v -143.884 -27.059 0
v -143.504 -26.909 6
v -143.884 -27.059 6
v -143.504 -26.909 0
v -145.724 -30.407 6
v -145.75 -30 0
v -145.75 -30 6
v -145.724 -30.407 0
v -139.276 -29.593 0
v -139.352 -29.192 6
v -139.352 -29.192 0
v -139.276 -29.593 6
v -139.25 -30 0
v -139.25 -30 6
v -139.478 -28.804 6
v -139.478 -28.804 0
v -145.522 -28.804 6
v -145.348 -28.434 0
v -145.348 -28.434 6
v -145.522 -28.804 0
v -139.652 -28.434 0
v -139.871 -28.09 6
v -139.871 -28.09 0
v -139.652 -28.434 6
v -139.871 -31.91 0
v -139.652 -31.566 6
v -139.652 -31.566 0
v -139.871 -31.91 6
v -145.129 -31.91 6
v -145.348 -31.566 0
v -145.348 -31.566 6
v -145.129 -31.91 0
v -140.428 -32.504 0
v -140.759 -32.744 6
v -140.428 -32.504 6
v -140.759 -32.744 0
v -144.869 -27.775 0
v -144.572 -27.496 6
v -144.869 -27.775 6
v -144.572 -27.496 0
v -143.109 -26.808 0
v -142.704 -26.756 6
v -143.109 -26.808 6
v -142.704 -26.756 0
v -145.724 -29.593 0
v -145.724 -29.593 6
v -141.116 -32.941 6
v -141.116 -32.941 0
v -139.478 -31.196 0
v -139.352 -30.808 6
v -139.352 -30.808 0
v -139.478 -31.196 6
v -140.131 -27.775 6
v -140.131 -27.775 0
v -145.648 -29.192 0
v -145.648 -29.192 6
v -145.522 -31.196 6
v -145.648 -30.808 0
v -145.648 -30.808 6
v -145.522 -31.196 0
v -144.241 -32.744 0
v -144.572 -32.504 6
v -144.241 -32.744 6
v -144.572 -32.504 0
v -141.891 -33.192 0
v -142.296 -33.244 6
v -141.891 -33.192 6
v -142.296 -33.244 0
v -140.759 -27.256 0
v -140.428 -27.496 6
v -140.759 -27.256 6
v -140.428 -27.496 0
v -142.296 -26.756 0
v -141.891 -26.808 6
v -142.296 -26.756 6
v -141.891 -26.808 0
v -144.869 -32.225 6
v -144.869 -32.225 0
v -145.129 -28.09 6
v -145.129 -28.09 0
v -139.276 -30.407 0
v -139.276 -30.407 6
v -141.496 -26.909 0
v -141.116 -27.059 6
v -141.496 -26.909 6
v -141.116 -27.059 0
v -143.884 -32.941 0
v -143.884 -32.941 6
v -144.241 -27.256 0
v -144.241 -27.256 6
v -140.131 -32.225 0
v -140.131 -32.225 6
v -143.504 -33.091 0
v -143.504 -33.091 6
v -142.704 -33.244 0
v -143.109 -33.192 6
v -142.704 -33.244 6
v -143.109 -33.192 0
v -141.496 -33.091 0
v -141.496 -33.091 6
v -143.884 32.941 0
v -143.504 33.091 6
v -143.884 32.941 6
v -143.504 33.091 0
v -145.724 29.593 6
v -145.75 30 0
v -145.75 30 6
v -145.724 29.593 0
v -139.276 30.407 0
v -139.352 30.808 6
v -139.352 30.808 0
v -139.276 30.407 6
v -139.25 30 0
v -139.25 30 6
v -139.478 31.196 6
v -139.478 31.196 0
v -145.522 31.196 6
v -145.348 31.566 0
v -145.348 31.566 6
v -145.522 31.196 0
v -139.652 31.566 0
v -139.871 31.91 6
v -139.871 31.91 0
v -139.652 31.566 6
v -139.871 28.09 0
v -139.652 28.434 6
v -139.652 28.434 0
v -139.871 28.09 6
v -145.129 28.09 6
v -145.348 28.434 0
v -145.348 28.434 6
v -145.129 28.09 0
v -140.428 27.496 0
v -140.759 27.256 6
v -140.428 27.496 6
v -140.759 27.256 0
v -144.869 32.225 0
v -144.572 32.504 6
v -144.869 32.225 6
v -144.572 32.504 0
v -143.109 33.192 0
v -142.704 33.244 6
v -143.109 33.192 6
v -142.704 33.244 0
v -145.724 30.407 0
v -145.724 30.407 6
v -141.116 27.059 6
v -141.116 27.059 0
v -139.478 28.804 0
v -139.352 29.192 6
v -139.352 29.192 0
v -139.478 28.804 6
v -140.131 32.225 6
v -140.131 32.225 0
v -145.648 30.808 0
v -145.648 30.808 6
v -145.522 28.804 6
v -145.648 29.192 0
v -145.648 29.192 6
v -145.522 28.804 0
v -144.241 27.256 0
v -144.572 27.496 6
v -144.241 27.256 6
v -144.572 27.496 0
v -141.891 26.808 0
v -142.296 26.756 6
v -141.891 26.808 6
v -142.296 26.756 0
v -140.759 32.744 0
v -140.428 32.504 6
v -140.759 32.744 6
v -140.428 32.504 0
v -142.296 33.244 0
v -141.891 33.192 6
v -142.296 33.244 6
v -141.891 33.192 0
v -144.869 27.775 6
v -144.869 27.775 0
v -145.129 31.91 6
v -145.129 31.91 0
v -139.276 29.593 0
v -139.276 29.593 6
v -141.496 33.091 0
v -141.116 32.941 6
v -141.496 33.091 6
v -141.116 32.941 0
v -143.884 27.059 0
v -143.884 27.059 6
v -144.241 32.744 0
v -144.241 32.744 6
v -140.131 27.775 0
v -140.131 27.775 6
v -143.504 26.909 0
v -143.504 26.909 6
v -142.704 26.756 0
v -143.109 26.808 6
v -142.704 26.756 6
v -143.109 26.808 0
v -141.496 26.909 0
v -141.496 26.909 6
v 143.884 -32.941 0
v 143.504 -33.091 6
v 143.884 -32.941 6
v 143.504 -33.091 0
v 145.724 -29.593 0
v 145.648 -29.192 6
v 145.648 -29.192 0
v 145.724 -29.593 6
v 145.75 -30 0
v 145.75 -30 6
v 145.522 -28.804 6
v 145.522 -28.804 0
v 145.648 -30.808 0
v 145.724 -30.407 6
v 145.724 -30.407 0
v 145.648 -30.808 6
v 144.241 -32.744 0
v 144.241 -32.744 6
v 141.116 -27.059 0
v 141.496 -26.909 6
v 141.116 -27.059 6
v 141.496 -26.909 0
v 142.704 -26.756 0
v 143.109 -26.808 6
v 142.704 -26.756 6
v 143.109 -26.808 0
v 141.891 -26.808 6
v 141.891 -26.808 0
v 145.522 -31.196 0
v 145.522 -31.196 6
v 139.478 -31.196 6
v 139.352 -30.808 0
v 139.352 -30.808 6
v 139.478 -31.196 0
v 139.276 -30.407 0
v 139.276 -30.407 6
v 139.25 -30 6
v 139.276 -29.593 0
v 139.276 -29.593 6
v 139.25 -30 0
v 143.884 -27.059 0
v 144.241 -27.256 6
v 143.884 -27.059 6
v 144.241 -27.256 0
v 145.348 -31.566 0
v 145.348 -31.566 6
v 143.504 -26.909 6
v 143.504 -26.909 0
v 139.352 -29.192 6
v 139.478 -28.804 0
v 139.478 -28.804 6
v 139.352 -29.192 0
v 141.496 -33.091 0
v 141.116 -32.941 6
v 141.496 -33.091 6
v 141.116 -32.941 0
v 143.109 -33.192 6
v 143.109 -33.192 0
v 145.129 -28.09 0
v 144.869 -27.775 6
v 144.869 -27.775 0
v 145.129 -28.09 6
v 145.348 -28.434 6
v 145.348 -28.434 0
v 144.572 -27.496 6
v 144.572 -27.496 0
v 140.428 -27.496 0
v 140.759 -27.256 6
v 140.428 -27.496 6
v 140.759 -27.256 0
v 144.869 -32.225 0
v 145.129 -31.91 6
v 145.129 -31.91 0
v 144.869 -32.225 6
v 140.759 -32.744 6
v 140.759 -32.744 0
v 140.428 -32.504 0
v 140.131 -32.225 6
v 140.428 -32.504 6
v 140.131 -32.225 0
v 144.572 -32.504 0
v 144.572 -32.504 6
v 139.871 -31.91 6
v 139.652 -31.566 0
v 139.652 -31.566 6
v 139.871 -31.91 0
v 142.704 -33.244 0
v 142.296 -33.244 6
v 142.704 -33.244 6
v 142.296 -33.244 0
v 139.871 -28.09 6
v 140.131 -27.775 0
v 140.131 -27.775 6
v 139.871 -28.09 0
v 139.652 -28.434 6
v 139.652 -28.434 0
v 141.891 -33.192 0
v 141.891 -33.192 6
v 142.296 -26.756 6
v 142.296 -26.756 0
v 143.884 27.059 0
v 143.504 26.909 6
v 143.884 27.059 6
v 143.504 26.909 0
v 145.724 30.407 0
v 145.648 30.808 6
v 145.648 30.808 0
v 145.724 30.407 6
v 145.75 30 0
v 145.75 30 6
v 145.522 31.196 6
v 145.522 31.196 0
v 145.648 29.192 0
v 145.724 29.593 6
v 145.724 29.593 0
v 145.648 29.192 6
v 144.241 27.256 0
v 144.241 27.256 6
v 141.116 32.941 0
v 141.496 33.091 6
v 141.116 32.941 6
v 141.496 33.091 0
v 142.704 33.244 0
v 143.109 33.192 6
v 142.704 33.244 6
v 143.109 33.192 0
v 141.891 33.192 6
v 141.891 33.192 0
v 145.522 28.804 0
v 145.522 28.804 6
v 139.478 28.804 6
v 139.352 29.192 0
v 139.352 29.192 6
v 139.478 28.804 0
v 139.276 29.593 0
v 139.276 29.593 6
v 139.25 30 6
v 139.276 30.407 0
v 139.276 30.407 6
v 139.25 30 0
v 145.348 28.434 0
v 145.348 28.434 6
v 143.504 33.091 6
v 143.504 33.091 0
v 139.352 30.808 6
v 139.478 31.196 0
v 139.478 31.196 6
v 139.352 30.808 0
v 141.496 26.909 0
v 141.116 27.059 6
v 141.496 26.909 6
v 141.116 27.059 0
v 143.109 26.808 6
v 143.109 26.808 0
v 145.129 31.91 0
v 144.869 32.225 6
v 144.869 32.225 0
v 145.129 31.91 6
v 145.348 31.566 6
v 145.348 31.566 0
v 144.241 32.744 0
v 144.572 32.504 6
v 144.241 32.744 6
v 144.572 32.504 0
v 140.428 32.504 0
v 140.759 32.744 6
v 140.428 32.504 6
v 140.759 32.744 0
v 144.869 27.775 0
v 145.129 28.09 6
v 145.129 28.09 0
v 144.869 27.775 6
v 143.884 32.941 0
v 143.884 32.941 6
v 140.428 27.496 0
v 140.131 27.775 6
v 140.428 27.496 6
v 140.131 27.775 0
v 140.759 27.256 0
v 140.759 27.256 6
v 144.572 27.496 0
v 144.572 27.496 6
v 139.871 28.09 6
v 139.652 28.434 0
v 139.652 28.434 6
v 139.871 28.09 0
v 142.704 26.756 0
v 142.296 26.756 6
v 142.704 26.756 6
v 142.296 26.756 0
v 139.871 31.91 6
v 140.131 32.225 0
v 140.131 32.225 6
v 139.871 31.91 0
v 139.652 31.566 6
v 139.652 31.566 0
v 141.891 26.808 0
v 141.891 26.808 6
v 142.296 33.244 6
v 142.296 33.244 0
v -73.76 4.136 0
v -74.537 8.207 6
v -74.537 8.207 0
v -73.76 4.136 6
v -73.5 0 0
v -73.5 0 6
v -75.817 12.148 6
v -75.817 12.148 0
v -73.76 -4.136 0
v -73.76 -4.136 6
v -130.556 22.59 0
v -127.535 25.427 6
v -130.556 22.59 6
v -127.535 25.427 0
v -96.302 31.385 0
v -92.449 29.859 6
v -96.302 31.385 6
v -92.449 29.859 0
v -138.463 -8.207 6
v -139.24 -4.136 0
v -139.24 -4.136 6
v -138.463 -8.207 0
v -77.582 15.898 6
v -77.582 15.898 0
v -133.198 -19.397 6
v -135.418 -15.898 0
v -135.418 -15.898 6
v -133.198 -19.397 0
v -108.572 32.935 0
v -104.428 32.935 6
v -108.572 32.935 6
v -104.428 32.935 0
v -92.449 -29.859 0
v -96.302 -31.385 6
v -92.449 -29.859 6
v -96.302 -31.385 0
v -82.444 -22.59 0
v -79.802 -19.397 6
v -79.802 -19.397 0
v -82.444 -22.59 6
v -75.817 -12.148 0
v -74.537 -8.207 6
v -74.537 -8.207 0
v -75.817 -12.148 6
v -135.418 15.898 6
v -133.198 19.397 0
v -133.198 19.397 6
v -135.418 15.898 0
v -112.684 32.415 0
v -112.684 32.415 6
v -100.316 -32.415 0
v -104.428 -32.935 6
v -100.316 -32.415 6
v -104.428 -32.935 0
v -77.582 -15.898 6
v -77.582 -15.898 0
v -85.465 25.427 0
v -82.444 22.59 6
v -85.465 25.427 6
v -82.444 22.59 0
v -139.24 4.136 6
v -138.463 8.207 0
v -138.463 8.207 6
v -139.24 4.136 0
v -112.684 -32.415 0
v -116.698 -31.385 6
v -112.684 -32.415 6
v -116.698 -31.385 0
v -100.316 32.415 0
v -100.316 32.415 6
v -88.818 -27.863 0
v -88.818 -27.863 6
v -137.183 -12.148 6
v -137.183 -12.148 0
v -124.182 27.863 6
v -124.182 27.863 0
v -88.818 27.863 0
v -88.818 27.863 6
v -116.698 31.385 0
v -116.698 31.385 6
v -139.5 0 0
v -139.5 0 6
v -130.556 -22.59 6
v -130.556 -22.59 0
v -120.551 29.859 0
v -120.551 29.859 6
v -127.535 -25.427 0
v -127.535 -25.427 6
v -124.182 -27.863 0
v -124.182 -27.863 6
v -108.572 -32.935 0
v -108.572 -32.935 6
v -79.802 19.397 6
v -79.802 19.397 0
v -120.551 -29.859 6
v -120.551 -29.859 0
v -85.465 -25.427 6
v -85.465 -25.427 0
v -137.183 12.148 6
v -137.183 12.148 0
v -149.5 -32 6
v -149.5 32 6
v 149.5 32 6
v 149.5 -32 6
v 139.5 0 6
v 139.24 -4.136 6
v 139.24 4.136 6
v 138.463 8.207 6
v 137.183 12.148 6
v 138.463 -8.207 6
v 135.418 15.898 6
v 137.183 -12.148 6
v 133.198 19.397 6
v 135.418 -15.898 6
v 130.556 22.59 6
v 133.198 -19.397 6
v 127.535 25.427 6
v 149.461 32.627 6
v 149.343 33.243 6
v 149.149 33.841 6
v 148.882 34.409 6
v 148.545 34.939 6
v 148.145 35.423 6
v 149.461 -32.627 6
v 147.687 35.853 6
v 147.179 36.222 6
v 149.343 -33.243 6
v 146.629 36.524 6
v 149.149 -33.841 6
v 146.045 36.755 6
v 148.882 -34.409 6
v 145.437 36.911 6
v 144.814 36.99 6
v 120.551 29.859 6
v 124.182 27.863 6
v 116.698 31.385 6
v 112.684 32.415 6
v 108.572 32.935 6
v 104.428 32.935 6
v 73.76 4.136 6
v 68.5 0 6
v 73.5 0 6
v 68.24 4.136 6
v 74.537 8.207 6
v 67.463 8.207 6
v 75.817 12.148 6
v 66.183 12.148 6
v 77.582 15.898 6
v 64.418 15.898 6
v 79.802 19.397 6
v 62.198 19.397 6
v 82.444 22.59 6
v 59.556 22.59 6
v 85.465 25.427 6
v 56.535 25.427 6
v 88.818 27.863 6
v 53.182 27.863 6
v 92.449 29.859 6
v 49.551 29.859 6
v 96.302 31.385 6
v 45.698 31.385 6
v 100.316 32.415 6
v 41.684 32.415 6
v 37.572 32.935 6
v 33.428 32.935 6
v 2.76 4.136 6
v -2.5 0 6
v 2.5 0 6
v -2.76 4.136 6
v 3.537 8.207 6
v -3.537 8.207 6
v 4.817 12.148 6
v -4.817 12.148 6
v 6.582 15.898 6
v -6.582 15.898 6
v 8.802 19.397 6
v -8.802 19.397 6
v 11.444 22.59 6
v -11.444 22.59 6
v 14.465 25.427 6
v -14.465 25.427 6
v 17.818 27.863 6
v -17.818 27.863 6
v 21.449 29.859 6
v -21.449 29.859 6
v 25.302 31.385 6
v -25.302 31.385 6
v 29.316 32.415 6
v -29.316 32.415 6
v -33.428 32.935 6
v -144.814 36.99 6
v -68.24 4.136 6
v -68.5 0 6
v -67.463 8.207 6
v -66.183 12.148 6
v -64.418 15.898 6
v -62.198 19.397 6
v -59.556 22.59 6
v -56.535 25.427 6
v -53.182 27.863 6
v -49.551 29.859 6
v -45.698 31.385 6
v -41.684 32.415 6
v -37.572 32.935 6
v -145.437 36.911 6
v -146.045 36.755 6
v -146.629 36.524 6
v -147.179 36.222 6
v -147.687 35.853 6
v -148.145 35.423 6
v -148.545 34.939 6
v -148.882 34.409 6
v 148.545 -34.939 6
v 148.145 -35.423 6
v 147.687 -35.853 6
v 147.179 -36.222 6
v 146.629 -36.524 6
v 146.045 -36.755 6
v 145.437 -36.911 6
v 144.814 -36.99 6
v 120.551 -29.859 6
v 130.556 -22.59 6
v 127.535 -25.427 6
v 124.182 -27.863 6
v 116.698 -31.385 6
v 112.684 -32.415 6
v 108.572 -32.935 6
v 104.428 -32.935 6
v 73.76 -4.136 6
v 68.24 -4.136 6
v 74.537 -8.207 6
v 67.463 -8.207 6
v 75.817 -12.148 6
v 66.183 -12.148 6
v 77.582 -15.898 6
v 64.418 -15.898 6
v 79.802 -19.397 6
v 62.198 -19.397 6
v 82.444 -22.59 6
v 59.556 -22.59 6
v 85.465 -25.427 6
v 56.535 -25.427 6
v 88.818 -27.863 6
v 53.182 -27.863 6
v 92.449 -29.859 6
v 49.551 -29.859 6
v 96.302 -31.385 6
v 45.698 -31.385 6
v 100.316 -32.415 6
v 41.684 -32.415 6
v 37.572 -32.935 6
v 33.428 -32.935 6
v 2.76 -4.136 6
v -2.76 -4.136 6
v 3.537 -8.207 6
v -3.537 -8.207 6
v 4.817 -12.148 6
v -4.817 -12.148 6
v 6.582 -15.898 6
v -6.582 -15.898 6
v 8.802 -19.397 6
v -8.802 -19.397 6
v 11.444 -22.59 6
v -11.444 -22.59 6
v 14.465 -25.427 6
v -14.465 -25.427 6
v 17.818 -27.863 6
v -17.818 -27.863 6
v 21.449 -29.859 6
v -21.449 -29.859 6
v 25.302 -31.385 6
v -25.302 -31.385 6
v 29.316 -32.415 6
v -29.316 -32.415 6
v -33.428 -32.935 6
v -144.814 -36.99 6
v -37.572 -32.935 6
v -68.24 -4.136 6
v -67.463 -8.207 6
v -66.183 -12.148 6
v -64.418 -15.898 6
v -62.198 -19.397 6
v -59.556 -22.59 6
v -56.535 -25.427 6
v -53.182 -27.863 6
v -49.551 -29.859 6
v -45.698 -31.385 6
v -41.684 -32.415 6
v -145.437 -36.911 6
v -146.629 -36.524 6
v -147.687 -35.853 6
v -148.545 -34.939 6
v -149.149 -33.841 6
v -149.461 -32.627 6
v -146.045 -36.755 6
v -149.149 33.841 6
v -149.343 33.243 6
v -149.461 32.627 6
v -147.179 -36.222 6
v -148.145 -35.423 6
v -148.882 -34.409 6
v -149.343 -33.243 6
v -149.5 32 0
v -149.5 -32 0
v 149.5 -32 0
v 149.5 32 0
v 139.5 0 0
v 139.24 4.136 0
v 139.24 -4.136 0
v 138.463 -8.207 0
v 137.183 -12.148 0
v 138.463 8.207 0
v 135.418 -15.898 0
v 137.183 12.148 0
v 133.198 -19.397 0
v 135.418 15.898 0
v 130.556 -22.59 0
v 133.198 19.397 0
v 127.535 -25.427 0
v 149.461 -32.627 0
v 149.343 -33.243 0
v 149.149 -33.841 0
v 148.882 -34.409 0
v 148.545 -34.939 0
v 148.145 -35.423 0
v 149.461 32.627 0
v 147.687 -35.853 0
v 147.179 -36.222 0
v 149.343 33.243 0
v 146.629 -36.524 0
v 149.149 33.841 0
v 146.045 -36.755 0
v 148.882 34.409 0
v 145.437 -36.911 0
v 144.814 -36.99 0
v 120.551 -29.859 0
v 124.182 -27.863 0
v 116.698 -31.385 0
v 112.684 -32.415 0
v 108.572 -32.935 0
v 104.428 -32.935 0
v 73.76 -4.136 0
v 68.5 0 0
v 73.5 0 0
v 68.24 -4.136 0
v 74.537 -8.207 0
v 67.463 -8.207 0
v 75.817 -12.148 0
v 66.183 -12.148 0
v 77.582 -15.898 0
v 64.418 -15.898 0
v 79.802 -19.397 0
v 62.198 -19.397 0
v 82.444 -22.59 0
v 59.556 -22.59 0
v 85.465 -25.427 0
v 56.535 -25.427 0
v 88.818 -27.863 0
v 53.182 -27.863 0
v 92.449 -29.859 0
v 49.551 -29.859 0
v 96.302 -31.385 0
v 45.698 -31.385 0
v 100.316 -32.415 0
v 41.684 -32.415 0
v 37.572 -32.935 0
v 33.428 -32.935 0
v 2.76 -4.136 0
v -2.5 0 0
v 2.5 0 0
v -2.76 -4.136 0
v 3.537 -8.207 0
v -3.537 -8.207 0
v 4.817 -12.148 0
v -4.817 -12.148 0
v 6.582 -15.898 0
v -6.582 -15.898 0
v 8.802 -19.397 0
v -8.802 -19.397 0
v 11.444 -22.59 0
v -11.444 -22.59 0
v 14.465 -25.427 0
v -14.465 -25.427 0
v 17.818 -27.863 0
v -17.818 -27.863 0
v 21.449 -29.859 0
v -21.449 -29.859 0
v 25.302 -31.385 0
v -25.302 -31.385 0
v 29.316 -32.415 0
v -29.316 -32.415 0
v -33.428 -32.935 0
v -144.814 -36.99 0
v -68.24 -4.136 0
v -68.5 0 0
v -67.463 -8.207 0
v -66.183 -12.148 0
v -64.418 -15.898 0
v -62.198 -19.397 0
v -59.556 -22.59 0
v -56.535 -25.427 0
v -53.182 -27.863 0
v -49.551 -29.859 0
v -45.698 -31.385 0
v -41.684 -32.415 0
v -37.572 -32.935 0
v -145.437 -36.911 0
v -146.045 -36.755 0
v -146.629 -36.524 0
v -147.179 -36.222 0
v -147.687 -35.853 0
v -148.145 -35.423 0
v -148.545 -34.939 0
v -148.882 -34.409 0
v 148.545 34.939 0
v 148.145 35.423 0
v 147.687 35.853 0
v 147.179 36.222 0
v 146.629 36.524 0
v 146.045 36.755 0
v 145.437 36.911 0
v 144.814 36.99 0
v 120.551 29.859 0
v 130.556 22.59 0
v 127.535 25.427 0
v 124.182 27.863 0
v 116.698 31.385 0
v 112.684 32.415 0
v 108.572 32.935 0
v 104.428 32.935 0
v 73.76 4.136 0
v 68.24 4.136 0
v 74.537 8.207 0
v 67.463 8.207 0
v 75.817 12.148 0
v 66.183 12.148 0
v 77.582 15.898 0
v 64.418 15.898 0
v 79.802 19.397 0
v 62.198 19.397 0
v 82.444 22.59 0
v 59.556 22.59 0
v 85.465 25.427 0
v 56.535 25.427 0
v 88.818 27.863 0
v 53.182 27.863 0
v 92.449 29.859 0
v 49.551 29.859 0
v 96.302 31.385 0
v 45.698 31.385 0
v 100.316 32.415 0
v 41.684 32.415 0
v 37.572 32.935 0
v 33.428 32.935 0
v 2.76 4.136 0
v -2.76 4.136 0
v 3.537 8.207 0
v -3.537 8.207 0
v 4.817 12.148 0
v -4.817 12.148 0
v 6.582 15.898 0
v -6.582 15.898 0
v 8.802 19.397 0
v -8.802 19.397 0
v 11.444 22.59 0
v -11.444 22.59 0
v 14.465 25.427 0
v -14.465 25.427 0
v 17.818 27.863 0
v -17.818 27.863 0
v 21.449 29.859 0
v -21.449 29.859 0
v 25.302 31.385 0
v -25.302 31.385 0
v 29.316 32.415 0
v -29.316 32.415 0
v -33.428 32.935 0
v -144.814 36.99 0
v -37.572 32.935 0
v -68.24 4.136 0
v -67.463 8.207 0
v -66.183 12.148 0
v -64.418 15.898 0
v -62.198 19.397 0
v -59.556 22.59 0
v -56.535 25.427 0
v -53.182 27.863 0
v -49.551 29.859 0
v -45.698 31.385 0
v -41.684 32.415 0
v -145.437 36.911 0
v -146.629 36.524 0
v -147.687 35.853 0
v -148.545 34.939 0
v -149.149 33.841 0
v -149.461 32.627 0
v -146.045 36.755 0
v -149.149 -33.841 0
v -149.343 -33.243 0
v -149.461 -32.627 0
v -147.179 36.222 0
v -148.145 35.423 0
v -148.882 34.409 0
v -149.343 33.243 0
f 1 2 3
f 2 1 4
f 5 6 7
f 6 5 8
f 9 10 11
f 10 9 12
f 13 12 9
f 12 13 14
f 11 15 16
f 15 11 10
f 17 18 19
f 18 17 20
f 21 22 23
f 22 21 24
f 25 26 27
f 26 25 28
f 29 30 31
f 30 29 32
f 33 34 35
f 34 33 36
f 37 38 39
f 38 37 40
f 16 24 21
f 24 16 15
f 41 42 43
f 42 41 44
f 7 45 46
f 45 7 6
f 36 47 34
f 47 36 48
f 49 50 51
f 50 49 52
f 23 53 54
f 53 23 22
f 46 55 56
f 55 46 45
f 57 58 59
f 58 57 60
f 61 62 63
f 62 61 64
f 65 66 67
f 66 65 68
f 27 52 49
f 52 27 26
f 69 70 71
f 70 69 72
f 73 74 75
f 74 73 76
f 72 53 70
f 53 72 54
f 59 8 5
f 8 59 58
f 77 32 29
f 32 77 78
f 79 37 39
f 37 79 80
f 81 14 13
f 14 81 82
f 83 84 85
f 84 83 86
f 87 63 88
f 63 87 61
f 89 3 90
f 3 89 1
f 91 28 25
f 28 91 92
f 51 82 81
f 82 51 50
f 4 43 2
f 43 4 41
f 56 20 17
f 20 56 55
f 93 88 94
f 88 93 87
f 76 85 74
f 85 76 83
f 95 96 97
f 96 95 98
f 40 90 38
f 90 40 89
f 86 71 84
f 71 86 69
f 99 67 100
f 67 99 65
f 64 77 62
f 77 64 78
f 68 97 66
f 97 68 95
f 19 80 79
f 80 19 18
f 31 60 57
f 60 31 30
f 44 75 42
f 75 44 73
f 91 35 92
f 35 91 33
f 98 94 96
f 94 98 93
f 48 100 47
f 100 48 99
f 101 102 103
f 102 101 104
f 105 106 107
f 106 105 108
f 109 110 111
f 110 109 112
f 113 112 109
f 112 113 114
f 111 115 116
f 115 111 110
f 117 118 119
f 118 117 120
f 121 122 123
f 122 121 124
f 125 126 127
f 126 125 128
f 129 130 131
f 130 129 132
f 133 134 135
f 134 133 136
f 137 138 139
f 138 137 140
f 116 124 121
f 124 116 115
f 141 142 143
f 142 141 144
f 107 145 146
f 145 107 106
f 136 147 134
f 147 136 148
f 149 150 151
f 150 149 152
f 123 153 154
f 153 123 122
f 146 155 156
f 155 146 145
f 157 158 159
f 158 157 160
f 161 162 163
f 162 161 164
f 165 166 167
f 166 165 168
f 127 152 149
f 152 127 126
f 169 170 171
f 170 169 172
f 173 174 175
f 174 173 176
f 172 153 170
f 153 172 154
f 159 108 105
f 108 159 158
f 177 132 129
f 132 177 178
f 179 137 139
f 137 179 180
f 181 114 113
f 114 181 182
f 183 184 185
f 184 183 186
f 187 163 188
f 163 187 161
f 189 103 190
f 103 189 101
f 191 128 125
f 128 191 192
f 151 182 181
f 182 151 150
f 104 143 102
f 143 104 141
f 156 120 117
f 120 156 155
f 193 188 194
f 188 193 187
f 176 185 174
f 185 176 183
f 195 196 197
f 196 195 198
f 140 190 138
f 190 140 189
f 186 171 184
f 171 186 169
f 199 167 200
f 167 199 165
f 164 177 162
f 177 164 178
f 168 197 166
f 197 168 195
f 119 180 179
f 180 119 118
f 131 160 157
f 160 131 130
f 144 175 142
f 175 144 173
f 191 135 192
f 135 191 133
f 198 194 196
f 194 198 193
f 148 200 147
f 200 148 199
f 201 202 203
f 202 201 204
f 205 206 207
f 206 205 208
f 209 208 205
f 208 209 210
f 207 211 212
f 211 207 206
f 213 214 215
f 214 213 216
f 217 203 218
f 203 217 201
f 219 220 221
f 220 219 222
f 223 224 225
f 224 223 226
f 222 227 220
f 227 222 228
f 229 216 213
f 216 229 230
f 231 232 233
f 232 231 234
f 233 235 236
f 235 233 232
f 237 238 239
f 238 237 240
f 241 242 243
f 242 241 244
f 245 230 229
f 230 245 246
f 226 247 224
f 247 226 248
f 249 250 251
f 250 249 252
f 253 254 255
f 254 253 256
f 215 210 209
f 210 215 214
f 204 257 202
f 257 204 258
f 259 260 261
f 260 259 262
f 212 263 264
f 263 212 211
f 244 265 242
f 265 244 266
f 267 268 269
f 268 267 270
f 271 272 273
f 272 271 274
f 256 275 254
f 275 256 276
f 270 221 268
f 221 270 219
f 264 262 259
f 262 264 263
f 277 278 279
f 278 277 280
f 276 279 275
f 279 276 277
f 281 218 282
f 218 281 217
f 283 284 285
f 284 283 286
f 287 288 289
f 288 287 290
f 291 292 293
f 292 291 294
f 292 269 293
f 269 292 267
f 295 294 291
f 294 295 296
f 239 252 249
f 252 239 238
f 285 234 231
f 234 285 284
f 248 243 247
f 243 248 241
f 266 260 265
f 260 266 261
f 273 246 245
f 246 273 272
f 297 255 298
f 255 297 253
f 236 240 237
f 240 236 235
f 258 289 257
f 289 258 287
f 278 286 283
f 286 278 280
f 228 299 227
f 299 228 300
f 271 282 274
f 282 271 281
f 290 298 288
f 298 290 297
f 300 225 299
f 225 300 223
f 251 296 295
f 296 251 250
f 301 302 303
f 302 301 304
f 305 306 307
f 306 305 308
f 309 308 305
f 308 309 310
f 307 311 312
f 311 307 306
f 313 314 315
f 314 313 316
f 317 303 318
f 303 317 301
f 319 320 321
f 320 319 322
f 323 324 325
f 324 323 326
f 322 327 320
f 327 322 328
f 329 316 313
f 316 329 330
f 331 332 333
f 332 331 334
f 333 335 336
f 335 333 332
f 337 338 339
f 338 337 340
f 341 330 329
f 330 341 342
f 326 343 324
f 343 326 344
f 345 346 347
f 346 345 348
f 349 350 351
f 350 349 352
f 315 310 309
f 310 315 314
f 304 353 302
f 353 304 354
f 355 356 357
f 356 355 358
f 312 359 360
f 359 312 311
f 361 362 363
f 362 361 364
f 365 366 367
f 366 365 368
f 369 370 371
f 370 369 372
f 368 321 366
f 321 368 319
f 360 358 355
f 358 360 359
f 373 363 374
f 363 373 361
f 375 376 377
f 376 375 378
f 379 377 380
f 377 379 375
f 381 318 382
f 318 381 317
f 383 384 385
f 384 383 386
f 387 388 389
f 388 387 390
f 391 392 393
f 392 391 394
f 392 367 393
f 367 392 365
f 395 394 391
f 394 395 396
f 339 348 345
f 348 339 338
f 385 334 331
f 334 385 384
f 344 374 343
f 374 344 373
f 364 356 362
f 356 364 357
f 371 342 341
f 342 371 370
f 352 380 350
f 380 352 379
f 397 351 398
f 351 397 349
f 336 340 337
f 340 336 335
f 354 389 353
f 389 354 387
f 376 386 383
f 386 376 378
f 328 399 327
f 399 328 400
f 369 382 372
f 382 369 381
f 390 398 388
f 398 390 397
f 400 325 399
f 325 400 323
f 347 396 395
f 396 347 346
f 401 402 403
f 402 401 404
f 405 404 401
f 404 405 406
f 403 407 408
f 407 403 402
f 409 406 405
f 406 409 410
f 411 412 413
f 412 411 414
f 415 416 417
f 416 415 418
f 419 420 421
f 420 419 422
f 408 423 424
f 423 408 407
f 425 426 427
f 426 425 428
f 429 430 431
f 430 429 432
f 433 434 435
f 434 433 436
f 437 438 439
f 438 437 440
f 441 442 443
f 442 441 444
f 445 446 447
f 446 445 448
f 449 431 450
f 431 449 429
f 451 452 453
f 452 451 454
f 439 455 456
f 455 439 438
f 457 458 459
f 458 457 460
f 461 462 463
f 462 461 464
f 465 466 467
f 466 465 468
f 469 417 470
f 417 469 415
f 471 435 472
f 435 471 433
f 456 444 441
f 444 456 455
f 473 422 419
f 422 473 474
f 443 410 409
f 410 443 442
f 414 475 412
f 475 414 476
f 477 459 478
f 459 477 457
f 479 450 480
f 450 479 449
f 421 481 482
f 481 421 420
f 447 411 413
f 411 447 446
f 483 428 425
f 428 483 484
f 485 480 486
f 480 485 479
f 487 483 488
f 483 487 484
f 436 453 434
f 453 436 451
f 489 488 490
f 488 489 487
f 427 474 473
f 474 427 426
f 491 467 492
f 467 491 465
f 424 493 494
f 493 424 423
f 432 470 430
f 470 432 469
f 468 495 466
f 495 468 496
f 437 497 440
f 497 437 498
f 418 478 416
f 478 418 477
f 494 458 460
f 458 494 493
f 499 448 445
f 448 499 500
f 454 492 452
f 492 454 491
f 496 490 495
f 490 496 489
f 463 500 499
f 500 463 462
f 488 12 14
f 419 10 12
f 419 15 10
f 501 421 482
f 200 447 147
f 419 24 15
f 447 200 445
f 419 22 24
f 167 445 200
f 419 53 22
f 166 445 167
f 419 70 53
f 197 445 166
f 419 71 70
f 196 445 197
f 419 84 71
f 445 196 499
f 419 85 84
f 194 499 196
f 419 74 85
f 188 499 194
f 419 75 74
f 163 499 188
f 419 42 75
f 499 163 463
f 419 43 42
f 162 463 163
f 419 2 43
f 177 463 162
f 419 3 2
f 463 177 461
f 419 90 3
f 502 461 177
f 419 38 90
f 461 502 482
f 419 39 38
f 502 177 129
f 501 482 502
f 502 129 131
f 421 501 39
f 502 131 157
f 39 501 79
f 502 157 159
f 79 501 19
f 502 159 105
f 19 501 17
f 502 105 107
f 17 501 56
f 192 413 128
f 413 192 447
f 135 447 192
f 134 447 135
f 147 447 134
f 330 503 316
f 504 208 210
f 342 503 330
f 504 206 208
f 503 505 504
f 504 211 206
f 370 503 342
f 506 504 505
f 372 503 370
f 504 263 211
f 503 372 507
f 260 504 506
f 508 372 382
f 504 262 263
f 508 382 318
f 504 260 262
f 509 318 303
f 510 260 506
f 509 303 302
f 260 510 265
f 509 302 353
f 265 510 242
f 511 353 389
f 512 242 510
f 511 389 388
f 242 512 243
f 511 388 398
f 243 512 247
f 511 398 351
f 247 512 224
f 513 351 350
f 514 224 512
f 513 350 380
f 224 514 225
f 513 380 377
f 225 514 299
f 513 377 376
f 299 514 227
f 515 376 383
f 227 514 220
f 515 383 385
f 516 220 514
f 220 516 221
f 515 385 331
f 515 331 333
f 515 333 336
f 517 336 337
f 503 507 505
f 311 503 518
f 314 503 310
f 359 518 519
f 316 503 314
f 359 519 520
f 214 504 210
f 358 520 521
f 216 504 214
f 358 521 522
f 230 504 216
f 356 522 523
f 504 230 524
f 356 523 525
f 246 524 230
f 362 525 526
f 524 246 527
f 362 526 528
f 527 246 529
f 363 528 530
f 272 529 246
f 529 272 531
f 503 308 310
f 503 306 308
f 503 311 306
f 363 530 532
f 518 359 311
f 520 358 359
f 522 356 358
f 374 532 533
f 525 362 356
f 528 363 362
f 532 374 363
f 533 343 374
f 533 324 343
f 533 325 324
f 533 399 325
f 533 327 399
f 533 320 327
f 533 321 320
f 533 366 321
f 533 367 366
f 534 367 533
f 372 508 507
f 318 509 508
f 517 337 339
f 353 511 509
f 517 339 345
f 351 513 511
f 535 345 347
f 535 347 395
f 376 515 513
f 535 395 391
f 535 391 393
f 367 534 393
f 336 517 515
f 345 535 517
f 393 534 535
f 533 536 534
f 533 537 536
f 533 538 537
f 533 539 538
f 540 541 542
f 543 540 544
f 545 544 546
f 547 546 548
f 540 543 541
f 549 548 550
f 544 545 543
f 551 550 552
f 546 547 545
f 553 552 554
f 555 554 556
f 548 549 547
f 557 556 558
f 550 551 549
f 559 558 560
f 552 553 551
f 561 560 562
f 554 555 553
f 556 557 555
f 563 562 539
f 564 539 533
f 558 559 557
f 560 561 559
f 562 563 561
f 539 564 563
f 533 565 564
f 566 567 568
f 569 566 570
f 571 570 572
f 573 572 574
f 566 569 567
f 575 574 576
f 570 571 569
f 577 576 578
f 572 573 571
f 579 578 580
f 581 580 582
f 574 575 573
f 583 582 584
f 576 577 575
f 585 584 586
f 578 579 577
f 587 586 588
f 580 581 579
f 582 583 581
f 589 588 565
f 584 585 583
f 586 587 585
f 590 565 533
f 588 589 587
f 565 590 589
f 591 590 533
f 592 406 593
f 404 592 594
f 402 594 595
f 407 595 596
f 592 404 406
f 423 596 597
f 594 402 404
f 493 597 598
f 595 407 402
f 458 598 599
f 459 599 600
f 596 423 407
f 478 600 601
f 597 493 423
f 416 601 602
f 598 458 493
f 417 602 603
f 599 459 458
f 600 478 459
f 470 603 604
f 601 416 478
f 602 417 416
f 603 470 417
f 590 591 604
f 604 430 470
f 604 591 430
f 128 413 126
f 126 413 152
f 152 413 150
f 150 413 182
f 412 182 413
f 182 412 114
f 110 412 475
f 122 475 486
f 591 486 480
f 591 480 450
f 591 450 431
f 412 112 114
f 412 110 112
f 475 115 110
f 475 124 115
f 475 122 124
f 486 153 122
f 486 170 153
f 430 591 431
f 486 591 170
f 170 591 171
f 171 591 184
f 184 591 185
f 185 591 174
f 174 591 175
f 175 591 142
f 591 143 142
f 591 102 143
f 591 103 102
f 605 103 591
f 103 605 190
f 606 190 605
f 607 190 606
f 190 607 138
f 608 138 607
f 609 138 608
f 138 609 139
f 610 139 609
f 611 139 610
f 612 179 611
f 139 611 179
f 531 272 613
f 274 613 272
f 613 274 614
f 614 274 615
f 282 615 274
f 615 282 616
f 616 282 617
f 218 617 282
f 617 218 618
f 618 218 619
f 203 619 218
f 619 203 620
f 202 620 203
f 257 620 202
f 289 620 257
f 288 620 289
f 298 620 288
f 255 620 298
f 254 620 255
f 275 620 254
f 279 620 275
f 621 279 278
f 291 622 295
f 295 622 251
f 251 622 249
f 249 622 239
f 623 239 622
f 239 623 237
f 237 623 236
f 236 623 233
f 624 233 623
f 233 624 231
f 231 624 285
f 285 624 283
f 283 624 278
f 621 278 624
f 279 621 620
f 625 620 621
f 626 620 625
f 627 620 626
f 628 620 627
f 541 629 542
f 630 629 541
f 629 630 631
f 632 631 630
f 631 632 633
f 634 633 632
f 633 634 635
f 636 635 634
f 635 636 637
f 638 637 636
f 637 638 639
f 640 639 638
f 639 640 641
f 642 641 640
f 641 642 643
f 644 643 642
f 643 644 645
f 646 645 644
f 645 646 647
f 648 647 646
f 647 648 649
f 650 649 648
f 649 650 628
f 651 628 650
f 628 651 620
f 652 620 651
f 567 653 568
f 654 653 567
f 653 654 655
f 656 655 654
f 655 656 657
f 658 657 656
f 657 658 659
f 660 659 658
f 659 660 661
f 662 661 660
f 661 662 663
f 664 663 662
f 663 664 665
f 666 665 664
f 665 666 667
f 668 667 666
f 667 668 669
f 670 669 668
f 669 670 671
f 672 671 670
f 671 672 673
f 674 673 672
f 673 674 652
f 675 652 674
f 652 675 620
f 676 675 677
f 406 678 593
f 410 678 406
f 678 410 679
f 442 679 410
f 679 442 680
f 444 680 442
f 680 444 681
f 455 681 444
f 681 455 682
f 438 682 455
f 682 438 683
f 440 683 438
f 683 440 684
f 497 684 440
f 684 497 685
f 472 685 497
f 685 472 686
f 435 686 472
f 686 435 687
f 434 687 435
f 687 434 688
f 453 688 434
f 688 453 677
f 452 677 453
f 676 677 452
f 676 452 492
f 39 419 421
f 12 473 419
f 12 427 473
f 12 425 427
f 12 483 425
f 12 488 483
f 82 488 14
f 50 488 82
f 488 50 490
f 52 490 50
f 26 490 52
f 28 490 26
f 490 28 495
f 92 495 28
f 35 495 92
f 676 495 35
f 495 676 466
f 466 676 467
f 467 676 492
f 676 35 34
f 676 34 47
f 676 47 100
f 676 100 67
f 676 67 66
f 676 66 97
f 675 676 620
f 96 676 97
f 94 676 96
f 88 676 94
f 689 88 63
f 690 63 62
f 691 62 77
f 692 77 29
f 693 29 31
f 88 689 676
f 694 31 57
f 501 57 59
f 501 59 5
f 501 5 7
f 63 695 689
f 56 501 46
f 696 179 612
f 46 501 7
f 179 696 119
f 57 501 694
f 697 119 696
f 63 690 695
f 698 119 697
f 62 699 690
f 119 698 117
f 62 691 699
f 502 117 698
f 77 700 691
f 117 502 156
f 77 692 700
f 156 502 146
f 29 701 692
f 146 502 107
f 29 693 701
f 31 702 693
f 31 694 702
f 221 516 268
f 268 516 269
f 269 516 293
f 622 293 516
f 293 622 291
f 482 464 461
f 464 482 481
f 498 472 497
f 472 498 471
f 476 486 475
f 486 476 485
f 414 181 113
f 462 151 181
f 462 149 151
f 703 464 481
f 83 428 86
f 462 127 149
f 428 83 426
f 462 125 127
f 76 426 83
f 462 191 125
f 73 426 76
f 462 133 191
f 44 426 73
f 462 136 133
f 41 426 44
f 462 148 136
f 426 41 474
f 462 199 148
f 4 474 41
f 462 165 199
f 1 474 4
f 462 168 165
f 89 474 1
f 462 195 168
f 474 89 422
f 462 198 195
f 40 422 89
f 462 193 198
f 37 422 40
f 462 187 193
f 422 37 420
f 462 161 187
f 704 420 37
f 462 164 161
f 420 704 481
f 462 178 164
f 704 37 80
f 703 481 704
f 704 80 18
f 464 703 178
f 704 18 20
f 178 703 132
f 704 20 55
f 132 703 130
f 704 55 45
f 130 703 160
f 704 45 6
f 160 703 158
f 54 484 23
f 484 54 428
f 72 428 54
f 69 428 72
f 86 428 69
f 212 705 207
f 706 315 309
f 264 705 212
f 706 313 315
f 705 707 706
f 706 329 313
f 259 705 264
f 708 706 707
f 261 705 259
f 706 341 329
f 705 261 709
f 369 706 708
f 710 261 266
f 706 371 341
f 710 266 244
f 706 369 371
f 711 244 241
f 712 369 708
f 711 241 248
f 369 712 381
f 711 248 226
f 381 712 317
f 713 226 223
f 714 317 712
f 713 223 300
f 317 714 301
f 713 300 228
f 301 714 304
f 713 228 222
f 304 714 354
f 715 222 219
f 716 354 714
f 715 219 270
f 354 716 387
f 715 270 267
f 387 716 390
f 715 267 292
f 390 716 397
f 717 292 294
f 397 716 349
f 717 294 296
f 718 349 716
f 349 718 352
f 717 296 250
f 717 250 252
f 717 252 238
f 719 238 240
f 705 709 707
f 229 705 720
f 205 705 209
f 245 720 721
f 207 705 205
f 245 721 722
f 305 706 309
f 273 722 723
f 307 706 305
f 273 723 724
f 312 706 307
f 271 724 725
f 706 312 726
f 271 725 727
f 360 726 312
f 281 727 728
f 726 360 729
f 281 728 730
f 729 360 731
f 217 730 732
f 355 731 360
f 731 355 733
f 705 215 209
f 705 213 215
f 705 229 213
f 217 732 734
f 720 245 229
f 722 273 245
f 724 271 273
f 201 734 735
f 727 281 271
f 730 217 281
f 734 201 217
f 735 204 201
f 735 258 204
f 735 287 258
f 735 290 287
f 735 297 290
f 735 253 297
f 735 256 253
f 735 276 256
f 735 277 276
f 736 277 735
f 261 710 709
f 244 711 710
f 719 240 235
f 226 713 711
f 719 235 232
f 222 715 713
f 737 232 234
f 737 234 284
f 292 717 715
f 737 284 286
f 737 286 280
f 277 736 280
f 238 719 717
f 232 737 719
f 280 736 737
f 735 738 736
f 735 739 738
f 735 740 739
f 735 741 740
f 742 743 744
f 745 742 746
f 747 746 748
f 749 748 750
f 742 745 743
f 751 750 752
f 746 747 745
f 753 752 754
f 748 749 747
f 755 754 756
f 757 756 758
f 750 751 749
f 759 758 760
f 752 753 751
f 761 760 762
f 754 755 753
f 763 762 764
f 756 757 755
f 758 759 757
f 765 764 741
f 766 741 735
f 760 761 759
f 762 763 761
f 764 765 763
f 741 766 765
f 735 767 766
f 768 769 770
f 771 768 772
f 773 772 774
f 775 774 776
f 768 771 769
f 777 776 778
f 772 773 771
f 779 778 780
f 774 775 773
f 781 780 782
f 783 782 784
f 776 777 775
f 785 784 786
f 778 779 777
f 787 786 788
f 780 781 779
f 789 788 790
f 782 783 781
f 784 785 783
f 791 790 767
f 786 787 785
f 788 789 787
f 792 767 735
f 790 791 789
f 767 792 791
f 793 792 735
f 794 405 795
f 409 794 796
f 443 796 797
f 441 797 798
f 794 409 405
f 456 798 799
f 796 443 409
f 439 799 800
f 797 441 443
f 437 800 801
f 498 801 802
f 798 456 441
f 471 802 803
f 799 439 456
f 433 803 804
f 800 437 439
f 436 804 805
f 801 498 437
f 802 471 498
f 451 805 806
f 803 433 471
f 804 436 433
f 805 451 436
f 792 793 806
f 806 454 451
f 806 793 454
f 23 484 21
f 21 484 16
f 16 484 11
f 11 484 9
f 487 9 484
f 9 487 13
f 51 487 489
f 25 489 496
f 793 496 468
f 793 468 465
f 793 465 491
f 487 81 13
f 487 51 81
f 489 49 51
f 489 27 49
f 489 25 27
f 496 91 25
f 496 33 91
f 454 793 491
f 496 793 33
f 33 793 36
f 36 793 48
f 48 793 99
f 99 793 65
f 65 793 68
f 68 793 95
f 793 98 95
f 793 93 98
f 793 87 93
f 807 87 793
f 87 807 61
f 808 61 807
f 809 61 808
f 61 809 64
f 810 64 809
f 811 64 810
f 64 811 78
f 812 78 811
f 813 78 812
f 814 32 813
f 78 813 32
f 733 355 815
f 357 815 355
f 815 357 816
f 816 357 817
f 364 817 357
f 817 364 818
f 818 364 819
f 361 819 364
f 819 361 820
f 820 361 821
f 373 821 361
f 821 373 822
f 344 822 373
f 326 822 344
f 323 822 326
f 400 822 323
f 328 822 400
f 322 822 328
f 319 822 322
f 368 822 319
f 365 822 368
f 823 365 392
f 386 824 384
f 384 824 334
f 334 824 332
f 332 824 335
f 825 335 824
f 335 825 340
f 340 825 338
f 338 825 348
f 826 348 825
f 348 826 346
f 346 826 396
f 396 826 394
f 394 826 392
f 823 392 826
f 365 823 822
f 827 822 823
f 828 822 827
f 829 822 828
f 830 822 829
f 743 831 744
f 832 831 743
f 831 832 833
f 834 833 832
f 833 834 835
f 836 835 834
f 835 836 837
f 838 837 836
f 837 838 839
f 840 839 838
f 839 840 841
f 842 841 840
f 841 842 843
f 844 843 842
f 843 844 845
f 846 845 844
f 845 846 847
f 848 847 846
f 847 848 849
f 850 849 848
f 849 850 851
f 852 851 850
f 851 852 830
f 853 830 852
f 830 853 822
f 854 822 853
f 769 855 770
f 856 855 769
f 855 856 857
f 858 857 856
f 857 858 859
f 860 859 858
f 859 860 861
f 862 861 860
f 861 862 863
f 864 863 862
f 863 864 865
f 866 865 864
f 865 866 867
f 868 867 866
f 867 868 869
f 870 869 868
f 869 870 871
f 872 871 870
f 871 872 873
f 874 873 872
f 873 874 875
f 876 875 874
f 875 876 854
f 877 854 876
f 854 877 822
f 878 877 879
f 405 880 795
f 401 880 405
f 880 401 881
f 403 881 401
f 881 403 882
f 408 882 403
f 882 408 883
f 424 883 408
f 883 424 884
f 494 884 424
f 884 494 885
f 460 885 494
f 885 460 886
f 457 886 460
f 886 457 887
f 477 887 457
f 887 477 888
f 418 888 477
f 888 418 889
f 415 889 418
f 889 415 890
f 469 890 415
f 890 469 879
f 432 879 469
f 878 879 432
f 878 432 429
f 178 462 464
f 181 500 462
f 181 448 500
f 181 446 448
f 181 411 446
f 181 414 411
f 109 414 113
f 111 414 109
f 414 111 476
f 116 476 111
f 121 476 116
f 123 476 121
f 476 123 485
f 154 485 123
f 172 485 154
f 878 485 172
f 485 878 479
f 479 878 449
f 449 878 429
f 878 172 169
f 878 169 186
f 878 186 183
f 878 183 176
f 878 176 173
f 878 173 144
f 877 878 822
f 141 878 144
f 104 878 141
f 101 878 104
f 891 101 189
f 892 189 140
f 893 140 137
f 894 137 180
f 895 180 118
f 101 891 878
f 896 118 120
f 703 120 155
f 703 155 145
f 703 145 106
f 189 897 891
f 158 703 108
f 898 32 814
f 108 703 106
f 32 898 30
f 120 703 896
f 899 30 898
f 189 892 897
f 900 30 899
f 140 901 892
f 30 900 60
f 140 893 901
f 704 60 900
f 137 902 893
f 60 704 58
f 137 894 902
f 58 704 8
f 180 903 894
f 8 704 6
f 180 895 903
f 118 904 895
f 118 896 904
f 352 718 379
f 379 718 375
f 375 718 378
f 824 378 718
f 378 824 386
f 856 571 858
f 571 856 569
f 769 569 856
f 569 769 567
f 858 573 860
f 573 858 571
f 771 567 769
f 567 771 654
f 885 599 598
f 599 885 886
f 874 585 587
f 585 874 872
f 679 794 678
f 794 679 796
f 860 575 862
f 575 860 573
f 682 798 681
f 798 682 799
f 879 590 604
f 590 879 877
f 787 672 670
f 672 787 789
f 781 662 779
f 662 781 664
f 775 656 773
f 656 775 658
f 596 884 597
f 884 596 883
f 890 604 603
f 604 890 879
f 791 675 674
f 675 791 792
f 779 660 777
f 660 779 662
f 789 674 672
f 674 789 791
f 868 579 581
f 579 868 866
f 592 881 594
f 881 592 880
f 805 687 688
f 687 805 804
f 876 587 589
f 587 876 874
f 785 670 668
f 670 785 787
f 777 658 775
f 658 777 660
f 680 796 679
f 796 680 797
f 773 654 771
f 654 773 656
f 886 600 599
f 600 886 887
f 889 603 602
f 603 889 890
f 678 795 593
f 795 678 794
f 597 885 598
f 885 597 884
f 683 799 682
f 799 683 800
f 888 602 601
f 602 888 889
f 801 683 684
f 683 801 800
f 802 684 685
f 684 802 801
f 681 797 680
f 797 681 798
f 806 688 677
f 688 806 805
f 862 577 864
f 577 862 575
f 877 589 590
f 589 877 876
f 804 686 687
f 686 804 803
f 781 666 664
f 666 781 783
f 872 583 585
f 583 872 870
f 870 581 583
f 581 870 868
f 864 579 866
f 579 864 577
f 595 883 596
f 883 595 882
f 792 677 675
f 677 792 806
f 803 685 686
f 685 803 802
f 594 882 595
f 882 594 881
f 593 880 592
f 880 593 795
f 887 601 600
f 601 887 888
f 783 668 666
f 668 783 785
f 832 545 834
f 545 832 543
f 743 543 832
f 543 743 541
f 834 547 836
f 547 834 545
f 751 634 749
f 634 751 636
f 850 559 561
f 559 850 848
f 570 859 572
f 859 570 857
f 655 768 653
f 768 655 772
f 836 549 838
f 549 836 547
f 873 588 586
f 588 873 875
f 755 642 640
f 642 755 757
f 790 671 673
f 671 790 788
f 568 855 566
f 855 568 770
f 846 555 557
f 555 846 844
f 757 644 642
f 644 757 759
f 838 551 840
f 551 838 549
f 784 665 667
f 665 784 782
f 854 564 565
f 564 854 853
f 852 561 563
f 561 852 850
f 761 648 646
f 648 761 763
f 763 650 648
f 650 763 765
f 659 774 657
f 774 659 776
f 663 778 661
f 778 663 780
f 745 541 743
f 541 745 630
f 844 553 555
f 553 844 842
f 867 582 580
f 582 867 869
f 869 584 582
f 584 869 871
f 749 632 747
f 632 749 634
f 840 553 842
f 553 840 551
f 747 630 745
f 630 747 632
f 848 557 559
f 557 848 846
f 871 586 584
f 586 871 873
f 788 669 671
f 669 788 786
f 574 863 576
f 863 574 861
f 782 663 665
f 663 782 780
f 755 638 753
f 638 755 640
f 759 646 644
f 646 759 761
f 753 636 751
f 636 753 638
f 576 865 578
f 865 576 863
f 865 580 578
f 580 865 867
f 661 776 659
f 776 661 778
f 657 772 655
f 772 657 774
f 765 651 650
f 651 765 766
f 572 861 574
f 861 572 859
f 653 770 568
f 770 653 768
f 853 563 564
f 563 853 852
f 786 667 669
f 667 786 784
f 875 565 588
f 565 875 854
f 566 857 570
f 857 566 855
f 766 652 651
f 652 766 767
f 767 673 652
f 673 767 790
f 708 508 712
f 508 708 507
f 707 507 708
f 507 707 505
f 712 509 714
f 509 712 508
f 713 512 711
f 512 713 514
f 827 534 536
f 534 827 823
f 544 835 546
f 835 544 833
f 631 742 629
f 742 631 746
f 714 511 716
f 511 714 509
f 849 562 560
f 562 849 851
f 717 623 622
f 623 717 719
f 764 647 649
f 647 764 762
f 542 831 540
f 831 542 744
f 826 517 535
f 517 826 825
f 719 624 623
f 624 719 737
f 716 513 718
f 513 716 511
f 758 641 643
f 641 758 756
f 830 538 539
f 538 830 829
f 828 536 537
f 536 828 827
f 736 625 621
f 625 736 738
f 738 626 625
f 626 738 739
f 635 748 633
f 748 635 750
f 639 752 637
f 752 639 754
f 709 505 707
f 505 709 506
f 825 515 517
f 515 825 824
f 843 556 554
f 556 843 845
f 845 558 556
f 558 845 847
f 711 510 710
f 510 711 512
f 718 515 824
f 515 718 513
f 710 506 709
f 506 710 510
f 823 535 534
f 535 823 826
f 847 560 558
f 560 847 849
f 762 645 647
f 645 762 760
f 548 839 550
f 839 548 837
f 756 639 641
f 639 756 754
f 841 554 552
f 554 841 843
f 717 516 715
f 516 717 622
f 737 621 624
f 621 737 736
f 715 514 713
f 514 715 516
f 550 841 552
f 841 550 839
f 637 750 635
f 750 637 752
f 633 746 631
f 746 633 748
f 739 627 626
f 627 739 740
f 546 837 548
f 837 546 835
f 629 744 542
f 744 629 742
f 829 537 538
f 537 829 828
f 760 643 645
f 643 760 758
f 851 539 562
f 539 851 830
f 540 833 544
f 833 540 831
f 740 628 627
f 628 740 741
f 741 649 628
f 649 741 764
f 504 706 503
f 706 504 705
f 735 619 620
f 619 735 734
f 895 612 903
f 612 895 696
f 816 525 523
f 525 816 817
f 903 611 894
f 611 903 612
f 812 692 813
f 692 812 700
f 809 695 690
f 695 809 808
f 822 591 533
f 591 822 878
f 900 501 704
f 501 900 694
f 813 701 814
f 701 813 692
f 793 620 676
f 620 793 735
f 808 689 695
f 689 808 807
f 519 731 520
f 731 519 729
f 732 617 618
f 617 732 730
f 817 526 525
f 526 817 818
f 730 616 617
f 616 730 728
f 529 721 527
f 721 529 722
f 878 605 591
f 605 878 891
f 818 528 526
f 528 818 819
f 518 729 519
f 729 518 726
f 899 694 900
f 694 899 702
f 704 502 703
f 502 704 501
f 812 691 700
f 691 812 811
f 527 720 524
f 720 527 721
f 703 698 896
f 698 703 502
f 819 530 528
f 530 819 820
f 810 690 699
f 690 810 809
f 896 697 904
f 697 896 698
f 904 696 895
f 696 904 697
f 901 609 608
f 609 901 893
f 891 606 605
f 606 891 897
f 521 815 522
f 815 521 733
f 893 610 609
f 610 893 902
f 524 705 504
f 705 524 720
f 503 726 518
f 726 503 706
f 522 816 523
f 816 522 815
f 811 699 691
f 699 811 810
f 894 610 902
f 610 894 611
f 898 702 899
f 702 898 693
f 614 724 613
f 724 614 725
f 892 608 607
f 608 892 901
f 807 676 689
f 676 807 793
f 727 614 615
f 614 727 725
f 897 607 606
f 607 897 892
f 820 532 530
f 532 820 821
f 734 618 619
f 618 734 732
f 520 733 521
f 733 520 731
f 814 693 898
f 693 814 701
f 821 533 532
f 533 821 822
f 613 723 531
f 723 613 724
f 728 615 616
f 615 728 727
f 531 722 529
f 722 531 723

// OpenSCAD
$fn = 50;

difference() {
	union() {
		hull() {
			translate(v = [-144.5, 32.0, 0]) {
				cylinder(h = 6, r = 5);
			}
			translate(v = [144.5, 32.0, 0]) {
				cylinder(h = 6, r = 5);
			}
			translate(v = [-144.5, -32.0, 0]) {
				cylinder(h = 6, r = 5);
			}
			translate(v = [144.5, -32.0, 0]) {
				cylinder(h = 6, r = 5);
			}
		}
	}
	union() {
		translate(v = [-142.5, -30.0, -100.0]) {
			cylinder(h = 200, r = 3.25);
		}
		translate(v = [-142.5, 30.0, -100.0]) {
			cylinder(h = 200, r = 3.25);
		}
		translate(v = [142.5, -30.0, -100.0]) {
			cylinder(h = 200, r = 3.25);
		}
		translate(v = [142.5, 30.0, -100.0]) {
			cylinder(h = 200, r = 3.25);
		}
		translate(v = [-142.5, -30.0, -100.0]) {
			cylinder(h = 200, r = 1.8);
		}
		translate(v = [-142.5, 30.0, -100.0]) {
			cylinder(h = 200, r = 1.8);
		}
		translate(v = [142.5, -30.0, -100.0]) {
			cylinder(h = 200, r = 1.8);
		}
		translate(v = [142.5, 30.0, -100.0]) {
			cylinder(h = 200, r = 1.8);
		}
		translate(v = [-106.5, 0, 0.0]) {
			cylinder(h = 6, r = 33.0);
		}
		translate(v = [-35.5, 0, 0.0]) {
			cylinder(h = 6, r = 33.0);
		}
		translate(v = [35.5, 0, 0.0]) {
			cylinder(h = 6, r = 33.0);
		}
		translate(v = [106.5, 0, 0.0]) {
			cylinder(h = 6, r = 33.0);
		}
	}
}
